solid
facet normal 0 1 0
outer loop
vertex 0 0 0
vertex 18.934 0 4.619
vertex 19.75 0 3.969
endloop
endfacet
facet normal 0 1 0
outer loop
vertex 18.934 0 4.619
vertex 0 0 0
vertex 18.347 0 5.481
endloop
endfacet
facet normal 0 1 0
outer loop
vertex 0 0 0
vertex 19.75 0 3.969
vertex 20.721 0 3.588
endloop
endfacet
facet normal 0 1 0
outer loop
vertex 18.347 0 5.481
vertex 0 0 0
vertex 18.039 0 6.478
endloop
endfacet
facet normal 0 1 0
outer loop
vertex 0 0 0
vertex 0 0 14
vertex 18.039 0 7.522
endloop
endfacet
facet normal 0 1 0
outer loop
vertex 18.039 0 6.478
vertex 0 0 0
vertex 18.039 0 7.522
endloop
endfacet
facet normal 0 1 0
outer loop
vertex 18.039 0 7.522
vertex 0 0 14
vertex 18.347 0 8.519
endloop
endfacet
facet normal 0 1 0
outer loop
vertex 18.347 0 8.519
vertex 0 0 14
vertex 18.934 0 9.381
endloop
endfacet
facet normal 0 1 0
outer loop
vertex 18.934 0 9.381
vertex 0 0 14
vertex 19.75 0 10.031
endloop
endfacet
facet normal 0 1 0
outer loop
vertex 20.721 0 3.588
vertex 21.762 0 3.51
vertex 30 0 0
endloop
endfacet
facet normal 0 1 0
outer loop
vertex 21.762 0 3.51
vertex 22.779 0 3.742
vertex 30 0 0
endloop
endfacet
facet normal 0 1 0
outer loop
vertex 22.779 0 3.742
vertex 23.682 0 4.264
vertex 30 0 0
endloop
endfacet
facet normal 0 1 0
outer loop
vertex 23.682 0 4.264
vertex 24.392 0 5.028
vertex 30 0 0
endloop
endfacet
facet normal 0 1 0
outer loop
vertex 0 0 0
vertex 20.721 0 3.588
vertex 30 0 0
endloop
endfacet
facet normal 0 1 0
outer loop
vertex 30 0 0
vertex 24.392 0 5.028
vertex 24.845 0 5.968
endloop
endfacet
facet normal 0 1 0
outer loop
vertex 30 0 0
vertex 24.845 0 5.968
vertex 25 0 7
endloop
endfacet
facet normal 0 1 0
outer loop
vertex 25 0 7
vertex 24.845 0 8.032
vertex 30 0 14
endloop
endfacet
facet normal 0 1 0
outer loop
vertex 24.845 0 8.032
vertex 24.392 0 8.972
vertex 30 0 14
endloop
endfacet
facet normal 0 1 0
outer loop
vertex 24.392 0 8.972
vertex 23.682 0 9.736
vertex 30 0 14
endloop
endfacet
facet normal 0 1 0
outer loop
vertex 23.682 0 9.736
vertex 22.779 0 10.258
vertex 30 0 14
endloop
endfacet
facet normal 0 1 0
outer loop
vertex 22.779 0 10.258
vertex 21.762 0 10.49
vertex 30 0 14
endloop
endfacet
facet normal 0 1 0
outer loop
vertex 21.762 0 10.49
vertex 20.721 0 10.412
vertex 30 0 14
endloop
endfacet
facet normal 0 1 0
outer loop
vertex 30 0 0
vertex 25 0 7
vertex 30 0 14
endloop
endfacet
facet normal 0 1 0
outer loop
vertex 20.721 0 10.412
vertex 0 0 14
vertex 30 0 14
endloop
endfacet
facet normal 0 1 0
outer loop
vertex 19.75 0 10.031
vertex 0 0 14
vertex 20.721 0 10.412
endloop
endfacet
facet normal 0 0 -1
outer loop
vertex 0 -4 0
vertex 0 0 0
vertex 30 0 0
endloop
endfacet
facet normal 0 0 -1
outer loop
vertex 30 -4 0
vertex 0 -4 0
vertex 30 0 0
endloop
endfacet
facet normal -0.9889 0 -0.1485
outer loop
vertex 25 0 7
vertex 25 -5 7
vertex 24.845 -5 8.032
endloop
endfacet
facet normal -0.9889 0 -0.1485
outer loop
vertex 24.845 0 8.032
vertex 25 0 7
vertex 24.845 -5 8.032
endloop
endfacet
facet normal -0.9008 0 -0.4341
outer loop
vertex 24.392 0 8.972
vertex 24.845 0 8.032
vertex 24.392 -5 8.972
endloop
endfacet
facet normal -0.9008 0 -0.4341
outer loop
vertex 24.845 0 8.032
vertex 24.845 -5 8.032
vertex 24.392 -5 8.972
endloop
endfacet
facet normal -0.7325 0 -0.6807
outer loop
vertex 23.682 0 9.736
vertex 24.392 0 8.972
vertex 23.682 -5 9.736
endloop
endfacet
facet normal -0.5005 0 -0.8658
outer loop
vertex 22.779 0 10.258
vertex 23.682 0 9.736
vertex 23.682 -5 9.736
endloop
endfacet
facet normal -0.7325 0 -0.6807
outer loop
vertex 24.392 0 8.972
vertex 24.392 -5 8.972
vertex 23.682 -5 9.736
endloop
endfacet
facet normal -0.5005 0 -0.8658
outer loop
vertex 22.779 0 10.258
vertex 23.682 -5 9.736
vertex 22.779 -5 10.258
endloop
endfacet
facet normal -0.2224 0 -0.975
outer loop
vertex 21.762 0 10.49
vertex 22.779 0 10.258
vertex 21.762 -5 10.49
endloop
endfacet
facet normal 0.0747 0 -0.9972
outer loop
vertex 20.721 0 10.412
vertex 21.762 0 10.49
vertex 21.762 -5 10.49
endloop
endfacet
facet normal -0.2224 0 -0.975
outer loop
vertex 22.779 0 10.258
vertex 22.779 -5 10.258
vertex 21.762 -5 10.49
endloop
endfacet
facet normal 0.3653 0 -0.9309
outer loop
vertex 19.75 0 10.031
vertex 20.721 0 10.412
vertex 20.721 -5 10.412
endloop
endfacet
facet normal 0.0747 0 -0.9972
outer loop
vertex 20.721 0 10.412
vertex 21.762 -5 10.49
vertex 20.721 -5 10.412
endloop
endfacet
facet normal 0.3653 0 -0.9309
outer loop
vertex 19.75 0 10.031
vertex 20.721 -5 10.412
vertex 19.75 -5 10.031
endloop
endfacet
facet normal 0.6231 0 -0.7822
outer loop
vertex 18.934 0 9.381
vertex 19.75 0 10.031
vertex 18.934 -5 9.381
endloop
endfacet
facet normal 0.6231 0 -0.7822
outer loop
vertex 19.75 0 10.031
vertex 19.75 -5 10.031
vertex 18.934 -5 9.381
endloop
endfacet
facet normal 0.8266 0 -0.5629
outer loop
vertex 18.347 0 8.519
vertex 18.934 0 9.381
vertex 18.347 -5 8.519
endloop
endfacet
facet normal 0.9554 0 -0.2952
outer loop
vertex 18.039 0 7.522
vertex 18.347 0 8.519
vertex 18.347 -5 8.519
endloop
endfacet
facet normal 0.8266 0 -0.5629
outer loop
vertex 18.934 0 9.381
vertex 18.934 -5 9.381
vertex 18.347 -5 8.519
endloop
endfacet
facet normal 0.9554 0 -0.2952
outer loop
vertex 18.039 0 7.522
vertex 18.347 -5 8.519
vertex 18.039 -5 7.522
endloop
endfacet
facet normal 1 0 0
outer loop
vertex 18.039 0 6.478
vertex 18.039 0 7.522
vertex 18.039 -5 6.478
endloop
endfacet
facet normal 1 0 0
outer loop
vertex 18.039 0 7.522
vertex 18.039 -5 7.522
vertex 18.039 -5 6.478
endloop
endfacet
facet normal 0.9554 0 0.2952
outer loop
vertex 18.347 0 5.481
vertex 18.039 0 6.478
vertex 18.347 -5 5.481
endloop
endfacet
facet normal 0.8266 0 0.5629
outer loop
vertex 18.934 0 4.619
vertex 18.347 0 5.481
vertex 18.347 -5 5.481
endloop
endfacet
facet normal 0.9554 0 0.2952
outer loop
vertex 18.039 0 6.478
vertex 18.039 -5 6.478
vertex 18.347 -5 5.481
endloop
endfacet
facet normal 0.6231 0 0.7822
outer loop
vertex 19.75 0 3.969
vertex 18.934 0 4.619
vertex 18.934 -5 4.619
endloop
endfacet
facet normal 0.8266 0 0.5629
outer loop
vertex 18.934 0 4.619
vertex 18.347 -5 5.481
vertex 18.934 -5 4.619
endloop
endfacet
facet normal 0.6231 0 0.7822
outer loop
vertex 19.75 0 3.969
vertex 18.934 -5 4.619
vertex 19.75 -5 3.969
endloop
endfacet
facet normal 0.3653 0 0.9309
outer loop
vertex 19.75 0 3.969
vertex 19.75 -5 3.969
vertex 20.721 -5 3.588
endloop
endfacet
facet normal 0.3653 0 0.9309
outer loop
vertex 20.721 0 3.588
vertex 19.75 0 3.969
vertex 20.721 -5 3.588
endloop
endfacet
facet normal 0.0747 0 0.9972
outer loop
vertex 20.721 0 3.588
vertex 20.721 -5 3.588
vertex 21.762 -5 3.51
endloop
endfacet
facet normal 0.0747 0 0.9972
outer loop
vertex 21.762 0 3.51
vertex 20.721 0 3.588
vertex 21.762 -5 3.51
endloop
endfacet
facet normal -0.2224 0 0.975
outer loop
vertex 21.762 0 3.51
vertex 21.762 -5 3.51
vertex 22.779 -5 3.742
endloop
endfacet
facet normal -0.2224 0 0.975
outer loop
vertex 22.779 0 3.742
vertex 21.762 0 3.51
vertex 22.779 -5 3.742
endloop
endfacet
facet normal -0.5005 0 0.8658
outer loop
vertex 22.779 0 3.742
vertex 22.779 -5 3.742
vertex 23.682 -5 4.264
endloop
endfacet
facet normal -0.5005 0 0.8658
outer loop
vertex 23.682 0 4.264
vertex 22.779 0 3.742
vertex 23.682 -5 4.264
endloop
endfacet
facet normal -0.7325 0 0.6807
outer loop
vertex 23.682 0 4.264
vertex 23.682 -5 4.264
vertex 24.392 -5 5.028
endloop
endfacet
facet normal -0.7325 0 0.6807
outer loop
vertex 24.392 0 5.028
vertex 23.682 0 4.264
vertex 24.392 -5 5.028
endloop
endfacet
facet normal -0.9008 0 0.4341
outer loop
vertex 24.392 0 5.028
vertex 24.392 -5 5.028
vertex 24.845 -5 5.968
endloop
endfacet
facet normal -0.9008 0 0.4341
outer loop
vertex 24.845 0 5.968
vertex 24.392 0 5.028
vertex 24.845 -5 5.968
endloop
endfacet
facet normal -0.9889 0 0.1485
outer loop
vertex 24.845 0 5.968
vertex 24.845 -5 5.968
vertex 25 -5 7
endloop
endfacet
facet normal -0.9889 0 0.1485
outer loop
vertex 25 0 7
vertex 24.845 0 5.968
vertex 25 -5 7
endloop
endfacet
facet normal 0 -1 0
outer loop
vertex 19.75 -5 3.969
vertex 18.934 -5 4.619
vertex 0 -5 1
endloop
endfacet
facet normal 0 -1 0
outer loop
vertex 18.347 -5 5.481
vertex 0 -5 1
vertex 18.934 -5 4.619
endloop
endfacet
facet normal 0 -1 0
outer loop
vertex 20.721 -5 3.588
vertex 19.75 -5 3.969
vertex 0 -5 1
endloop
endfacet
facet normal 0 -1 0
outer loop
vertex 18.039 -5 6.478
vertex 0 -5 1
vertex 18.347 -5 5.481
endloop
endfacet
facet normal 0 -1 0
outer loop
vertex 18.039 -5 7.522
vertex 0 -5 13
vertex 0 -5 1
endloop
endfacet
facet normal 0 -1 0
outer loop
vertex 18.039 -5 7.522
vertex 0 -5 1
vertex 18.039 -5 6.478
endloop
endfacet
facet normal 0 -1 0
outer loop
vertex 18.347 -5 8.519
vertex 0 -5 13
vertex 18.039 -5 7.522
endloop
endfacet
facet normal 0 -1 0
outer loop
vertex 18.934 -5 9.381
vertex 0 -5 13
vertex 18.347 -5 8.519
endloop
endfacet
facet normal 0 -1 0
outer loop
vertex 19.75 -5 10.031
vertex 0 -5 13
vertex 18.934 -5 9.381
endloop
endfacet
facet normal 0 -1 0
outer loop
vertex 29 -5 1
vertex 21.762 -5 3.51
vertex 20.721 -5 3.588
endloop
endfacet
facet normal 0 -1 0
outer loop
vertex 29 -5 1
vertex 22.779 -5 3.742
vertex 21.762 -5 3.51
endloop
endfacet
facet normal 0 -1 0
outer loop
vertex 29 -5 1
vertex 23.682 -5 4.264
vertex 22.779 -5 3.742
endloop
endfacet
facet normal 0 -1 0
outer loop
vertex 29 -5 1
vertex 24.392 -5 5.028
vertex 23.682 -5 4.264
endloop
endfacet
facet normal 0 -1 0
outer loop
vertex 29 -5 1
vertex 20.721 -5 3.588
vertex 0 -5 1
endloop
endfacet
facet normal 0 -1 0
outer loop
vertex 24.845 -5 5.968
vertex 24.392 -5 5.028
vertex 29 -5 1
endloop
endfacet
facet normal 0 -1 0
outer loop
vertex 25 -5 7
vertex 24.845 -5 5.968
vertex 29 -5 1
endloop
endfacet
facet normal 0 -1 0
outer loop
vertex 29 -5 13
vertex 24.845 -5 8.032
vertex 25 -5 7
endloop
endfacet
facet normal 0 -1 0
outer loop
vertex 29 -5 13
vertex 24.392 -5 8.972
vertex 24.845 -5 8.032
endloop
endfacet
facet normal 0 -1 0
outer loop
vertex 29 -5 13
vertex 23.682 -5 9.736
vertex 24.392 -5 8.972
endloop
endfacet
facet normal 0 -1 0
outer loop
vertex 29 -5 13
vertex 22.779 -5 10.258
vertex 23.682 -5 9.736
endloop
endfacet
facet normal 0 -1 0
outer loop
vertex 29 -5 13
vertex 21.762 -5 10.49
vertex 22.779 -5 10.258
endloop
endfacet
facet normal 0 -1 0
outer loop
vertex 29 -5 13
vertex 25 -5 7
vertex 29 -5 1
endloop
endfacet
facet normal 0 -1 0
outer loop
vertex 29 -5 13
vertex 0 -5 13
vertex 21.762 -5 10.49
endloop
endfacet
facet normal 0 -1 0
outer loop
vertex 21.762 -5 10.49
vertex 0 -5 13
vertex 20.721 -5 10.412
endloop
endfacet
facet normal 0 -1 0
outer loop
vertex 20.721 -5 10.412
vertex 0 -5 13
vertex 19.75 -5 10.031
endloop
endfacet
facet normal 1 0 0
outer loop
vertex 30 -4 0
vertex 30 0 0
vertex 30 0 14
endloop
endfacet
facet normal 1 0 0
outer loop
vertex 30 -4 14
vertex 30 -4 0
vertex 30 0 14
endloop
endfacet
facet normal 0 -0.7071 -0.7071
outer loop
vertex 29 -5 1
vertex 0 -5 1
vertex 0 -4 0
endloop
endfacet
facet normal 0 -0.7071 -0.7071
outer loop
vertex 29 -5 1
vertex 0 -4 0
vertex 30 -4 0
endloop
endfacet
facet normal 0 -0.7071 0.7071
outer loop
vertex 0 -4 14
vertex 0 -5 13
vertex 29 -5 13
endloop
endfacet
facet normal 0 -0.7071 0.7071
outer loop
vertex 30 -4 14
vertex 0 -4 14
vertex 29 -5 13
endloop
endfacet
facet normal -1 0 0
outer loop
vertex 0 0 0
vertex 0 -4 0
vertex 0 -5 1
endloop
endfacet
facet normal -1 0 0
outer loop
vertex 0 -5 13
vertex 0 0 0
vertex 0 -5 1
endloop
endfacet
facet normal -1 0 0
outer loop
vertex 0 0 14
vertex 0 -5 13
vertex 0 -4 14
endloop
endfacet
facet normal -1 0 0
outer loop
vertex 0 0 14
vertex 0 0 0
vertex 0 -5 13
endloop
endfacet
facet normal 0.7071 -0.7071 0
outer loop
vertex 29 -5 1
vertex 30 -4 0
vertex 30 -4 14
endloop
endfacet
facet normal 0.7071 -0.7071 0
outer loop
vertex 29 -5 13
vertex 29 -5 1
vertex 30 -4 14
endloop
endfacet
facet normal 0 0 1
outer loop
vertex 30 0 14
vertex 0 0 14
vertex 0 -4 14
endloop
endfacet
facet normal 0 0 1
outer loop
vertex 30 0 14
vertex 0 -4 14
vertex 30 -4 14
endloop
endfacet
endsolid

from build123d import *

# Parameters (mm, degrees)
F0_W     = 30
F0_H     = 14
F1_DEPTH = 5
F2_R     = 3.5
F3_DEPTH = 5.001
F4_SIZE  = 1


with BuildPart() as f1:
    # F0 (on Front) → F1 (new body)
    with BuildSketch(Plane.XZ):
        with Locations((15, 7)):
            Rectangle(F0_W, F0_H)
    extrude(amount=F1_DEPTH)

    # F2 (on face) → F3 (cut, through all)
    with BuildSketch(Plane.XZ.offset(5)):
        with Locations((21.5, 7)):
            Circle(F2_R)
    extrude(amount=-F3_DEPTH, mode=Mode.SUBTRACT)

    # F4
    f4_edges = [f1.edges().sort_by_distance(p)[0] for p in [
        (15, -5, 14),
        (30, -5, 7),
        (15, -5, 0),
    ]]
    chamfer(f4_edges, length=F4_SIZE)


solid = f1.part
